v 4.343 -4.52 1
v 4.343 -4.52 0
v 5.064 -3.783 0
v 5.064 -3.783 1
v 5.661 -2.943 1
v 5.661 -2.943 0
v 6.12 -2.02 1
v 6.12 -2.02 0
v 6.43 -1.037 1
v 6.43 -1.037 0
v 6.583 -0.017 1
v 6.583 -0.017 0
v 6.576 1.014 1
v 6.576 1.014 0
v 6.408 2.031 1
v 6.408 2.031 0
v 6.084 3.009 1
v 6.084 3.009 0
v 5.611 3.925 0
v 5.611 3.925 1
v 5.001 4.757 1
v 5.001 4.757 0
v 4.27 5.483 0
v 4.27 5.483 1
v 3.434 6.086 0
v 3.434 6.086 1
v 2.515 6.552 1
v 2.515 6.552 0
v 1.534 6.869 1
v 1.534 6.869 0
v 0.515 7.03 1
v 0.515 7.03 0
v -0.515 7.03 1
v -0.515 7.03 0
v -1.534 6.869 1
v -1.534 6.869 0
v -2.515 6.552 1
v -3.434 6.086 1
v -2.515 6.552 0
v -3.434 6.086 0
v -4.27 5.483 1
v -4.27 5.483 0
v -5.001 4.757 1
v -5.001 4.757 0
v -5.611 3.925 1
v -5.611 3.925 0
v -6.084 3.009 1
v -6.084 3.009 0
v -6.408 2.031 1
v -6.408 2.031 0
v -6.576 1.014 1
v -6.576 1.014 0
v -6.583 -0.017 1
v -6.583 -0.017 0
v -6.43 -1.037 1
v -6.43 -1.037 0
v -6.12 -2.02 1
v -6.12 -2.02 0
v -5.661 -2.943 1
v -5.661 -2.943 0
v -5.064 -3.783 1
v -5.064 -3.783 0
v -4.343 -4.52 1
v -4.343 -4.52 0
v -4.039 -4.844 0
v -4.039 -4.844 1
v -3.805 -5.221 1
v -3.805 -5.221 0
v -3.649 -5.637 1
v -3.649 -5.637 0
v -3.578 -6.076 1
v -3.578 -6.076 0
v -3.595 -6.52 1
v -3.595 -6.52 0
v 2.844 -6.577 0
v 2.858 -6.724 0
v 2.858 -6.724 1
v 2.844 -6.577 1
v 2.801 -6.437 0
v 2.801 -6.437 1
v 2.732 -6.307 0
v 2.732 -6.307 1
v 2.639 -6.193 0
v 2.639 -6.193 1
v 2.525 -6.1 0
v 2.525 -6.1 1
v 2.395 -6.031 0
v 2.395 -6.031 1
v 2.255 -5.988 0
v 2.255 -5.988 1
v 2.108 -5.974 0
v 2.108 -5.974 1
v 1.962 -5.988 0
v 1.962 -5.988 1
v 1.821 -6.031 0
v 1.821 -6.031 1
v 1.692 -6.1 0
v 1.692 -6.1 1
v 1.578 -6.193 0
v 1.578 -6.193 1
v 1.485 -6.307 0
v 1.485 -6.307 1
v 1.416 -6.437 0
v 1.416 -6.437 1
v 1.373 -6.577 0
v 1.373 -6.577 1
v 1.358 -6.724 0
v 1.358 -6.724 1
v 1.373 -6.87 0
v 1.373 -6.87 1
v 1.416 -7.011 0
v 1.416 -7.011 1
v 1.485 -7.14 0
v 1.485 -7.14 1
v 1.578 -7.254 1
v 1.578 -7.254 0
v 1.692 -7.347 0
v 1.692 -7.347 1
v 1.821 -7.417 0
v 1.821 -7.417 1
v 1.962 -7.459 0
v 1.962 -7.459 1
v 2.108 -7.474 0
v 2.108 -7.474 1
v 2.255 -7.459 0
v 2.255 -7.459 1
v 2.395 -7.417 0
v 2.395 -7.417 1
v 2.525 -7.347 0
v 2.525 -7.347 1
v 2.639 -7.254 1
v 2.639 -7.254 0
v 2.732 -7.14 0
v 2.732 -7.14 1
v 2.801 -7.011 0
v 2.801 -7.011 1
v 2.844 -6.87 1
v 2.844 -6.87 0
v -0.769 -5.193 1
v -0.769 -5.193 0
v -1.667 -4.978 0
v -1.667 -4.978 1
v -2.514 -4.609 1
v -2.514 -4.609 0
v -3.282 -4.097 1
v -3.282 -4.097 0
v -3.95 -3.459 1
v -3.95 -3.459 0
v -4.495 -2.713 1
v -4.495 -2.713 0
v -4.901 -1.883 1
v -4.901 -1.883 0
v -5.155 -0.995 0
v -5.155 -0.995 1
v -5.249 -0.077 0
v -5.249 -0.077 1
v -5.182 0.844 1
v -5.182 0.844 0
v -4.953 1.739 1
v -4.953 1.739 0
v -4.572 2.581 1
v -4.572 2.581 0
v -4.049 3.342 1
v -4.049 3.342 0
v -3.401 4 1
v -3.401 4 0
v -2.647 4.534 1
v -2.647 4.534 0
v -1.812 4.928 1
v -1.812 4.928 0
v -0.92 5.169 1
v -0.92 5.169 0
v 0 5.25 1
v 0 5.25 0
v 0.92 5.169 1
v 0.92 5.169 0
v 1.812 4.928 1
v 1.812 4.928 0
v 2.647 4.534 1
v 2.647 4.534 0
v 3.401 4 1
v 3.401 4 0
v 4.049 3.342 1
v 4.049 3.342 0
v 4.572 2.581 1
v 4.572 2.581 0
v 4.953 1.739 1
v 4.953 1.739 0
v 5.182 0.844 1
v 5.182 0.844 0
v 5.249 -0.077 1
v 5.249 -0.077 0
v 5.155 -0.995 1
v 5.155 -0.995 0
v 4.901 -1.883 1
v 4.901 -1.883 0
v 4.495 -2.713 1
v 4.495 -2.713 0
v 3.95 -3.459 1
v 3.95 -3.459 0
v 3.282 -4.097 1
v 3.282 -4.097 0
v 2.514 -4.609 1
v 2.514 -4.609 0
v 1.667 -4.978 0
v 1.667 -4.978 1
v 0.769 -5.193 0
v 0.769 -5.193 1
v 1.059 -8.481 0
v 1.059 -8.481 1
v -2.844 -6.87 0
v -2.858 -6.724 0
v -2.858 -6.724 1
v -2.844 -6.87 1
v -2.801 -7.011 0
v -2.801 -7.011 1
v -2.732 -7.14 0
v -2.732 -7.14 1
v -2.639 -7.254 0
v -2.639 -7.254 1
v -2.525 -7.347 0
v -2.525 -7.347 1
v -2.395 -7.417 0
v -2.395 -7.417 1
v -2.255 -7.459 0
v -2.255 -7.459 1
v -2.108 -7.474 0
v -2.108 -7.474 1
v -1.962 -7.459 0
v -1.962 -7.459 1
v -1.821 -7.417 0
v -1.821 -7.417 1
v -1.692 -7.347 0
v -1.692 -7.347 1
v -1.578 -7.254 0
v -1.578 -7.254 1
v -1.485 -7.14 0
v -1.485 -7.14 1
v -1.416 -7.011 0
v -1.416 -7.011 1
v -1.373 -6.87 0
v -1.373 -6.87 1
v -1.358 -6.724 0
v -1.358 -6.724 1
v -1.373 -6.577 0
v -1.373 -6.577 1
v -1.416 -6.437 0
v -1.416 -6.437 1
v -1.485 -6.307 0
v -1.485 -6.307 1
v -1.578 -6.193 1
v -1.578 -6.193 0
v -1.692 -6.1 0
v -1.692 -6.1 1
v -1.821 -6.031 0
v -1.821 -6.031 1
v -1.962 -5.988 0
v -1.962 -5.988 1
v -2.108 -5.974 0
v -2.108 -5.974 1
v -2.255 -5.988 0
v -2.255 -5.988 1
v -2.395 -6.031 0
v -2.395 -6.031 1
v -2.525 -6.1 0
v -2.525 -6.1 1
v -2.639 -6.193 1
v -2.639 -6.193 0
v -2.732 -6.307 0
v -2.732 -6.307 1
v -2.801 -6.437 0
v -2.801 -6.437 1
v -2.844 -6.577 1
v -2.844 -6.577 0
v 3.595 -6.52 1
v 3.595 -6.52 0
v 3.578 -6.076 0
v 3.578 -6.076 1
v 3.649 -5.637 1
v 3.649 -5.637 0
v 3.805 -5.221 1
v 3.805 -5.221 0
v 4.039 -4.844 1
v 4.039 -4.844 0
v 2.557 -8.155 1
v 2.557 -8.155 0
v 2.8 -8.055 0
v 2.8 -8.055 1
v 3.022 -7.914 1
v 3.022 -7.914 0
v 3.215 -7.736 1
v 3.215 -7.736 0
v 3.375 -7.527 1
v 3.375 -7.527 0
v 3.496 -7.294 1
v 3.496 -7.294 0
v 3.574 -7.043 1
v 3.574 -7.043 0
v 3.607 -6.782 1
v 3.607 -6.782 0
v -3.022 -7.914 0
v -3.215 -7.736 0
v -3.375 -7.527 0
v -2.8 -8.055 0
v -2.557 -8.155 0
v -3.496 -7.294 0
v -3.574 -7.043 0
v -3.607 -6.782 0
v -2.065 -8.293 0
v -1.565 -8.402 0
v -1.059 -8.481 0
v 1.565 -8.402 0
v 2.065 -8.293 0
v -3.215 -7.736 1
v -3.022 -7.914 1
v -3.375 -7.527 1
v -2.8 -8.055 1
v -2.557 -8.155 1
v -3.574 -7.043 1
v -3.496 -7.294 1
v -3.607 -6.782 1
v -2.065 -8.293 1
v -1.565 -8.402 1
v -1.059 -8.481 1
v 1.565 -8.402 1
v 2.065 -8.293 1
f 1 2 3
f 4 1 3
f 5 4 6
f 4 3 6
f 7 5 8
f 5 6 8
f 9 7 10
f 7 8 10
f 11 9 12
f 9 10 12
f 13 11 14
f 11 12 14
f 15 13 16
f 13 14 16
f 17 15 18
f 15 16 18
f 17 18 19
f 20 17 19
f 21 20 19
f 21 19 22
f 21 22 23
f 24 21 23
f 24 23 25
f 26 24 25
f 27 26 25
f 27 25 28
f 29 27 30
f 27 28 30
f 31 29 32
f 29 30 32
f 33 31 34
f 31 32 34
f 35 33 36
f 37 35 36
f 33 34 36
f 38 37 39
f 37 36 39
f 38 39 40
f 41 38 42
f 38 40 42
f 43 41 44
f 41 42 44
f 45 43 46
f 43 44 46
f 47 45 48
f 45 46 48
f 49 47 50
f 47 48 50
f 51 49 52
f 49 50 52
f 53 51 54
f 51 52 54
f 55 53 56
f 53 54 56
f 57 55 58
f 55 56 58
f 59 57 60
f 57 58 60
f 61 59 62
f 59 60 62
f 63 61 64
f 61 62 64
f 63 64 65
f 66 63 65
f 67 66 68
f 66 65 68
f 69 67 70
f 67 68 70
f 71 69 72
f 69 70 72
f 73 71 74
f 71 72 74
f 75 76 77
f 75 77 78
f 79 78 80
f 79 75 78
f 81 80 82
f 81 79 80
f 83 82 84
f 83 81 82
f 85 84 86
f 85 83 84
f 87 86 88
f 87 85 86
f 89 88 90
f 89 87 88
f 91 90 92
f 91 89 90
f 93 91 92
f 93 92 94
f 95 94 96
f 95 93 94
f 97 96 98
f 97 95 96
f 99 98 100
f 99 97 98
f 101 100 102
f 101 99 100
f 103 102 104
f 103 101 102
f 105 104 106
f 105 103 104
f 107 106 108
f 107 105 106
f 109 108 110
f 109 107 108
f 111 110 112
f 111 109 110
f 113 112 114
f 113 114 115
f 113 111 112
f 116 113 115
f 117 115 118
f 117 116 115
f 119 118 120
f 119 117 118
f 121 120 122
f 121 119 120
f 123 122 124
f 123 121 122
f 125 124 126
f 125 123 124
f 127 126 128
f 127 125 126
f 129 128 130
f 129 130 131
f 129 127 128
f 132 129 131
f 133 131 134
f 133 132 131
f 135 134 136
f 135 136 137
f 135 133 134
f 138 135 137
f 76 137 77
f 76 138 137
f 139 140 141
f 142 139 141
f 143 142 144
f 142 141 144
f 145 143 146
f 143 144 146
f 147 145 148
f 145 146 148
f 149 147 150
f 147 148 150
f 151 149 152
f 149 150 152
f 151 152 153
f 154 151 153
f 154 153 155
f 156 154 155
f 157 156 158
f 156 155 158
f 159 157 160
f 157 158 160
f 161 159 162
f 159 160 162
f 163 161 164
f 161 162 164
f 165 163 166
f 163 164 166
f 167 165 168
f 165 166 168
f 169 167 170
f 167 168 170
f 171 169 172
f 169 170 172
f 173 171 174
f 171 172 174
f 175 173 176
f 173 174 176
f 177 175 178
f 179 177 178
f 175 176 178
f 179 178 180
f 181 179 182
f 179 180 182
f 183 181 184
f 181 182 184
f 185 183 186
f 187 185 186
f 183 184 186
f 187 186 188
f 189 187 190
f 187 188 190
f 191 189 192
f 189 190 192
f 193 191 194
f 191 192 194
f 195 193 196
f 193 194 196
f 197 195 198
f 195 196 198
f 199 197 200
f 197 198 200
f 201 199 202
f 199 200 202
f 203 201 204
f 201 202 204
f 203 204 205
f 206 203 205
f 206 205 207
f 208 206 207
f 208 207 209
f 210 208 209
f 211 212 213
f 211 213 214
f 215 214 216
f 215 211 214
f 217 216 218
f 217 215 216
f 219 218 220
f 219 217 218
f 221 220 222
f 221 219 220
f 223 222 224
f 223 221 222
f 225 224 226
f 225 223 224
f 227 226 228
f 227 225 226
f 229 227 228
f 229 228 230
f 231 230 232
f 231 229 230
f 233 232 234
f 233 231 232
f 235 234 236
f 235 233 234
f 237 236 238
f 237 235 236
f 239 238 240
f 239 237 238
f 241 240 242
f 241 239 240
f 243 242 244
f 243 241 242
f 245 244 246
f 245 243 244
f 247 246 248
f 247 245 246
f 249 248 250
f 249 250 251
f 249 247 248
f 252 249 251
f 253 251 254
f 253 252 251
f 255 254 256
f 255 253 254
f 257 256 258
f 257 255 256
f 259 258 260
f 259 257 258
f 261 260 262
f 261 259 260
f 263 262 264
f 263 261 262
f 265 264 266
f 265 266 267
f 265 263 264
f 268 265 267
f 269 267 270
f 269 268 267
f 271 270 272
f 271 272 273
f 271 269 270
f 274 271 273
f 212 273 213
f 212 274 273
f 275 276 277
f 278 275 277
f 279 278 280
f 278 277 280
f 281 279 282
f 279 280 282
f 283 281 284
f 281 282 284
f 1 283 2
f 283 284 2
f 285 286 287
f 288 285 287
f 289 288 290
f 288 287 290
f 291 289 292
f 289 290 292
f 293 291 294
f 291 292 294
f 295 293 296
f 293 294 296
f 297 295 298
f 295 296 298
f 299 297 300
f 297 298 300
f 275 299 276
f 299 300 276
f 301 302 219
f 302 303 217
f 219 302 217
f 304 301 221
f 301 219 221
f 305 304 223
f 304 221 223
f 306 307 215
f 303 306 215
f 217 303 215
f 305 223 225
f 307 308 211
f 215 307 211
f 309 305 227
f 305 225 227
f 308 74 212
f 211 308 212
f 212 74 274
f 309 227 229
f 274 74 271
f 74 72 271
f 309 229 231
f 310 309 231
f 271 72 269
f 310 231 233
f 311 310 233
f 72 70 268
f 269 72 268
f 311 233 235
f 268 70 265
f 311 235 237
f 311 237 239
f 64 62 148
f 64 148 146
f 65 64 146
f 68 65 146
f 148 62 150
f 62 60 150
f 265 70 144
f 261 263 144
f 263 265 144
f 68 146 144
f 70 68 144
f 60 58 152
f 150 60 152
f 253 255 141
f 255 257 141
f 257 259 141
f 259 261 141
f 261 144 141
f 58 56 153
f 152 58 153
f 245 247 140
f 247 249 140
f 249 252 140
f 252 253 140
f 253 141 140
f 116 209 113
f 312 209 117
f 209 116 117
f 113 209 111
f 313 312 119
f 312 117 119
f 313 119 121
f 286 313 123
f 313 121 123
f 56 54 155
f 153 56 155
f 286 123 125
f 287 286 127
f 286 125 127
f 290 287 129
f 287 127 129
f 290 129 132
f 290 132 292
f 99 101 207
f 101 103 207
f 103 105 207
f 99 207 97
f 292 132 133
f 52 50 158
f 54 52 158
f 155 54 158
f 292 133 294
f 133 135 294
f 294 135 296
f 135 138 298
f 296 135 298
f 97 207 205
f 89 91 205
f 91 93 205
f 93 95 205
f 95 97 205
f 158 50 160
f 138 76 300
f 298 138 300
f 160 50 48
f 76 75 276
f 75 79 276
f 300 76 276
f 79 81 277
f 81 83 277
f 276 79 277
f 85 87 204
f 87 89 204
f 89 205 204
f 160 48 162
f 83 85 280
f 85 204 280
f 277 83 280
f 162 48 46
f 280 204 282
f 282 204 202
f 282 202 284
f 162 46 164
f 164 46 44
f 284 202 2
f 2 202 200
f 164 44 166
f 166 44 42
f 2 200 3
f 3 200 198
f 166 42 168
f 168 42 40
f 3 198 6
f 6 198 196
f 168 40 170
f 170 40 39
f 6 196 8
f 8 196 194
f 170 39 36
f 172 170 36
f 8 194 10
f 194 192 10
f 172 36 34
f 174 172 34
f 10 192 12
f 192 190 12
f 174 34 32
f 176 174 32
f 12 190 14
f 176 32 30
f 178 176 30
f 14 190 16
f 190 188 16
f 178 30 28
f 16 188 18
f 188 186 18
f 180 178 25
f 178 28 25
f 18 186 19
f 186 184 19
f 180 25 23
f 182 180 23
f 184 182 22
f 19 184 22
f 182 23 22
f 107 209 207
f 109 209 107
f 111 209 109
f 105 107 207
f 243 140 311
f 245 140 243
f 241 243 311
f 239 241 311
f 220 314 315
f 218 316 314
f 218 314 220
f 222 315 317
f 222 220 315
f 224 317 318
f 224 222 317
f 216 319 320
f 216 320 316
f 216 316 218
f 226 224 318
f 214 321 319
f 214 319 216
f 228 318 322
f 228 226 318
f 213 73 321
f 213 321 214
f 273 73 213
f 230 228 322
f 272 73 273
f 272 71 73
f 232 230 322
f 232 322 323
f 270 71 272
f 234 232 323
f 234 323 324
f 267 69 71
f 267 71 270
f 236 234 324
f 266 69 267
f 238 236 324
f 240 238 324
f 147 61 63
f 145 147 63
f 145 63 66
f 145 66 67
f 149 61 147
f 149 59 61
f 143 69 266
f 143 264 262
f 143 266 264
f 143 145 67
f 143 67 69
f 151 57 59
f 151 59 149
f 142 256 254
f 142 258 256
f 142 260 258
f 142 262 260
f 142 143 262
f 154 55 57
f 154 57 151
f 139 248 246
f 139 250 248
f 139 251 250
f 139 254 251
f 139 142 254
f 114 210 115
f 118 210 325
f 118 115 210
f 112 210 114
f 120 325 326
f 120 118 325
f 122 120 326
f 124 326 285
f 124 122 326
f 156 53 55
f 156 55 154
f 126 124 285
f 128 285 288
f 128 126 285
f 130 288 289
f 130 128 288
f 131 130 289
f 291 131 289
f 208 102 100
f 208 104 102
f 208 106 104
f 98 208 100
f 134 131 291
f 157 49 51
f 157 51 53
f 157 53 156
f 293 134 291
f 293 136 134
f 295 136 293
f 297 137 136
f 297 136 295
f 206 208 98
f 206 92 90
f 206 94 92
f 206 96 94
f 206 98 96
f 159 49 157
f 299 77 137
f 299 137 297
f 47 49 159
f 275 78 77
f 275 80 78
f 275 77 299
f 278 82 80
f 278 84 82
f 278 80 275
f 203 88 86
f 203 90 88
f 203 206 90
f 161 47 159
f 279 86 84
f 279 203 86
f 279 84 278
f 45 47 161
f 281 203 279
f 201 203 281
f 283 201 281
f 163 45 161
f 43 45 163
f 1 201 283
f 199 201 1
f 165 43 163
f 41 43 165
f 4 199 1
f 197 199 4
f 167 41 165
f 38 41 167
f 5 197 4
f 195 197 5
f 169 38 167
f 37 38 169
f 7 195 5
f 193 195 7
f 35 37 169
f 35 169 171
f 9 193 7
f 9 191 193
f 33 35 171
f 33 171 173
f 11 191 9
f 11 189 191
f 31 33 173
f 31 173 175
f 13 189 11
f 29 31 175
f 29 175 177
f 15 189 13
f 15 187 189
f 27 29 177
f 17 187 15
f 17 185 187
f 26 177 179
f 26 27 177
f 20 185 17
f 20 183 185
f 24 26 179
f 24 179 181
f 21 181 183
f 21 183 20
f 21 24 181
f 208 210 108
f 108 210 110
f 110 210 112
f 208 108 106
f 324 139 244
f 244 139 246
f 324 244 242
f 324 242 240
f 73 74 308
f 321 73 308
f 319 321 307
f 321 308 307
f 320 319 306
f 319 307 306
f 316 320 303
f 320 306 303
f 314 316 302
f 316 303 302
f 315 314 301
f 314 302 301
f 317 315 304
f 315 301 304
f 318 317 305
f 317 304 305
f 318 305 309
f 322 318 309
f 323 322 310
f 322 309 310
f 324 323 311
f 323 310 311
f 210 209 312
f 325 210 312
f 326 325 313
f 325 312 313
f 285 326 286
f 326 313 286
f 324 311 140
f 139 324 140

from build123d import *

# Parameters (mm, degrees)
ESQUISSE1_R          = 0.75
BASE_EXTRUSION_DEPTH = 1


with BuildPart() as part:
    # Esquisse1 → Base-Extrusion (new body)
    with BuildSketch(Plane.XY):
        with BuildLine():
            Line((0.768639364, -5.193427917), (1.058921586, -8.480635886))
            ThreePointArc((1.058921586, -8.480635886), (1.81541267, -8.351453574), (2.557265456, -8.154930615))
            ThreePointArc((2.557265456, -8.154930615), (3.375091505, -7.527139269), (3.594515939, -6.519759332))
            ThreePointArc((3.594515939, -6.519759332), (3.716376435, -5.425266349), (4.343048041, -4.519701572))
            ThreePointArc((4.343048041, -4.519701572), (0, 7.05), (-4.343048041, -4.519701572))
            ThreePointArc((-4.343048041, -4.519701572), (-3.716376435, -5.425266349), (-3.594515939, -6.519759332))
            ThreePointArc((-3.594515939, -6.519759332), (-3.375091505, -7.527139269), (-2.557265456, -8.154930615))
            ThreePointArc((-2.557265456, -8.154930615), (-1.81541267, -8.351453574), (-1.058921586, -8.480635886))
            Line((-1.058921586, -8.480635886), (-0.768639364, -5.193427917))
            ThreePointArc((-0.768639364, -5.193427917), (0, 5.25), (0.768639364, -5.193427917))
        make_face()
        with Locations((2.108438165, -6.723653541)):
            Circle(ESQUISSE1_R, mode=Mode.SUBTRACT)
        with Locations(Location((-2.108438165, -6.723653541, 0), (0, 0, 180))):
            Circle(ESQUISSE1_R, mode=Mode.SUBTRACT)
    extrude(amount=BASE_EXTRUSION_DEPTH)


solid = part.part
